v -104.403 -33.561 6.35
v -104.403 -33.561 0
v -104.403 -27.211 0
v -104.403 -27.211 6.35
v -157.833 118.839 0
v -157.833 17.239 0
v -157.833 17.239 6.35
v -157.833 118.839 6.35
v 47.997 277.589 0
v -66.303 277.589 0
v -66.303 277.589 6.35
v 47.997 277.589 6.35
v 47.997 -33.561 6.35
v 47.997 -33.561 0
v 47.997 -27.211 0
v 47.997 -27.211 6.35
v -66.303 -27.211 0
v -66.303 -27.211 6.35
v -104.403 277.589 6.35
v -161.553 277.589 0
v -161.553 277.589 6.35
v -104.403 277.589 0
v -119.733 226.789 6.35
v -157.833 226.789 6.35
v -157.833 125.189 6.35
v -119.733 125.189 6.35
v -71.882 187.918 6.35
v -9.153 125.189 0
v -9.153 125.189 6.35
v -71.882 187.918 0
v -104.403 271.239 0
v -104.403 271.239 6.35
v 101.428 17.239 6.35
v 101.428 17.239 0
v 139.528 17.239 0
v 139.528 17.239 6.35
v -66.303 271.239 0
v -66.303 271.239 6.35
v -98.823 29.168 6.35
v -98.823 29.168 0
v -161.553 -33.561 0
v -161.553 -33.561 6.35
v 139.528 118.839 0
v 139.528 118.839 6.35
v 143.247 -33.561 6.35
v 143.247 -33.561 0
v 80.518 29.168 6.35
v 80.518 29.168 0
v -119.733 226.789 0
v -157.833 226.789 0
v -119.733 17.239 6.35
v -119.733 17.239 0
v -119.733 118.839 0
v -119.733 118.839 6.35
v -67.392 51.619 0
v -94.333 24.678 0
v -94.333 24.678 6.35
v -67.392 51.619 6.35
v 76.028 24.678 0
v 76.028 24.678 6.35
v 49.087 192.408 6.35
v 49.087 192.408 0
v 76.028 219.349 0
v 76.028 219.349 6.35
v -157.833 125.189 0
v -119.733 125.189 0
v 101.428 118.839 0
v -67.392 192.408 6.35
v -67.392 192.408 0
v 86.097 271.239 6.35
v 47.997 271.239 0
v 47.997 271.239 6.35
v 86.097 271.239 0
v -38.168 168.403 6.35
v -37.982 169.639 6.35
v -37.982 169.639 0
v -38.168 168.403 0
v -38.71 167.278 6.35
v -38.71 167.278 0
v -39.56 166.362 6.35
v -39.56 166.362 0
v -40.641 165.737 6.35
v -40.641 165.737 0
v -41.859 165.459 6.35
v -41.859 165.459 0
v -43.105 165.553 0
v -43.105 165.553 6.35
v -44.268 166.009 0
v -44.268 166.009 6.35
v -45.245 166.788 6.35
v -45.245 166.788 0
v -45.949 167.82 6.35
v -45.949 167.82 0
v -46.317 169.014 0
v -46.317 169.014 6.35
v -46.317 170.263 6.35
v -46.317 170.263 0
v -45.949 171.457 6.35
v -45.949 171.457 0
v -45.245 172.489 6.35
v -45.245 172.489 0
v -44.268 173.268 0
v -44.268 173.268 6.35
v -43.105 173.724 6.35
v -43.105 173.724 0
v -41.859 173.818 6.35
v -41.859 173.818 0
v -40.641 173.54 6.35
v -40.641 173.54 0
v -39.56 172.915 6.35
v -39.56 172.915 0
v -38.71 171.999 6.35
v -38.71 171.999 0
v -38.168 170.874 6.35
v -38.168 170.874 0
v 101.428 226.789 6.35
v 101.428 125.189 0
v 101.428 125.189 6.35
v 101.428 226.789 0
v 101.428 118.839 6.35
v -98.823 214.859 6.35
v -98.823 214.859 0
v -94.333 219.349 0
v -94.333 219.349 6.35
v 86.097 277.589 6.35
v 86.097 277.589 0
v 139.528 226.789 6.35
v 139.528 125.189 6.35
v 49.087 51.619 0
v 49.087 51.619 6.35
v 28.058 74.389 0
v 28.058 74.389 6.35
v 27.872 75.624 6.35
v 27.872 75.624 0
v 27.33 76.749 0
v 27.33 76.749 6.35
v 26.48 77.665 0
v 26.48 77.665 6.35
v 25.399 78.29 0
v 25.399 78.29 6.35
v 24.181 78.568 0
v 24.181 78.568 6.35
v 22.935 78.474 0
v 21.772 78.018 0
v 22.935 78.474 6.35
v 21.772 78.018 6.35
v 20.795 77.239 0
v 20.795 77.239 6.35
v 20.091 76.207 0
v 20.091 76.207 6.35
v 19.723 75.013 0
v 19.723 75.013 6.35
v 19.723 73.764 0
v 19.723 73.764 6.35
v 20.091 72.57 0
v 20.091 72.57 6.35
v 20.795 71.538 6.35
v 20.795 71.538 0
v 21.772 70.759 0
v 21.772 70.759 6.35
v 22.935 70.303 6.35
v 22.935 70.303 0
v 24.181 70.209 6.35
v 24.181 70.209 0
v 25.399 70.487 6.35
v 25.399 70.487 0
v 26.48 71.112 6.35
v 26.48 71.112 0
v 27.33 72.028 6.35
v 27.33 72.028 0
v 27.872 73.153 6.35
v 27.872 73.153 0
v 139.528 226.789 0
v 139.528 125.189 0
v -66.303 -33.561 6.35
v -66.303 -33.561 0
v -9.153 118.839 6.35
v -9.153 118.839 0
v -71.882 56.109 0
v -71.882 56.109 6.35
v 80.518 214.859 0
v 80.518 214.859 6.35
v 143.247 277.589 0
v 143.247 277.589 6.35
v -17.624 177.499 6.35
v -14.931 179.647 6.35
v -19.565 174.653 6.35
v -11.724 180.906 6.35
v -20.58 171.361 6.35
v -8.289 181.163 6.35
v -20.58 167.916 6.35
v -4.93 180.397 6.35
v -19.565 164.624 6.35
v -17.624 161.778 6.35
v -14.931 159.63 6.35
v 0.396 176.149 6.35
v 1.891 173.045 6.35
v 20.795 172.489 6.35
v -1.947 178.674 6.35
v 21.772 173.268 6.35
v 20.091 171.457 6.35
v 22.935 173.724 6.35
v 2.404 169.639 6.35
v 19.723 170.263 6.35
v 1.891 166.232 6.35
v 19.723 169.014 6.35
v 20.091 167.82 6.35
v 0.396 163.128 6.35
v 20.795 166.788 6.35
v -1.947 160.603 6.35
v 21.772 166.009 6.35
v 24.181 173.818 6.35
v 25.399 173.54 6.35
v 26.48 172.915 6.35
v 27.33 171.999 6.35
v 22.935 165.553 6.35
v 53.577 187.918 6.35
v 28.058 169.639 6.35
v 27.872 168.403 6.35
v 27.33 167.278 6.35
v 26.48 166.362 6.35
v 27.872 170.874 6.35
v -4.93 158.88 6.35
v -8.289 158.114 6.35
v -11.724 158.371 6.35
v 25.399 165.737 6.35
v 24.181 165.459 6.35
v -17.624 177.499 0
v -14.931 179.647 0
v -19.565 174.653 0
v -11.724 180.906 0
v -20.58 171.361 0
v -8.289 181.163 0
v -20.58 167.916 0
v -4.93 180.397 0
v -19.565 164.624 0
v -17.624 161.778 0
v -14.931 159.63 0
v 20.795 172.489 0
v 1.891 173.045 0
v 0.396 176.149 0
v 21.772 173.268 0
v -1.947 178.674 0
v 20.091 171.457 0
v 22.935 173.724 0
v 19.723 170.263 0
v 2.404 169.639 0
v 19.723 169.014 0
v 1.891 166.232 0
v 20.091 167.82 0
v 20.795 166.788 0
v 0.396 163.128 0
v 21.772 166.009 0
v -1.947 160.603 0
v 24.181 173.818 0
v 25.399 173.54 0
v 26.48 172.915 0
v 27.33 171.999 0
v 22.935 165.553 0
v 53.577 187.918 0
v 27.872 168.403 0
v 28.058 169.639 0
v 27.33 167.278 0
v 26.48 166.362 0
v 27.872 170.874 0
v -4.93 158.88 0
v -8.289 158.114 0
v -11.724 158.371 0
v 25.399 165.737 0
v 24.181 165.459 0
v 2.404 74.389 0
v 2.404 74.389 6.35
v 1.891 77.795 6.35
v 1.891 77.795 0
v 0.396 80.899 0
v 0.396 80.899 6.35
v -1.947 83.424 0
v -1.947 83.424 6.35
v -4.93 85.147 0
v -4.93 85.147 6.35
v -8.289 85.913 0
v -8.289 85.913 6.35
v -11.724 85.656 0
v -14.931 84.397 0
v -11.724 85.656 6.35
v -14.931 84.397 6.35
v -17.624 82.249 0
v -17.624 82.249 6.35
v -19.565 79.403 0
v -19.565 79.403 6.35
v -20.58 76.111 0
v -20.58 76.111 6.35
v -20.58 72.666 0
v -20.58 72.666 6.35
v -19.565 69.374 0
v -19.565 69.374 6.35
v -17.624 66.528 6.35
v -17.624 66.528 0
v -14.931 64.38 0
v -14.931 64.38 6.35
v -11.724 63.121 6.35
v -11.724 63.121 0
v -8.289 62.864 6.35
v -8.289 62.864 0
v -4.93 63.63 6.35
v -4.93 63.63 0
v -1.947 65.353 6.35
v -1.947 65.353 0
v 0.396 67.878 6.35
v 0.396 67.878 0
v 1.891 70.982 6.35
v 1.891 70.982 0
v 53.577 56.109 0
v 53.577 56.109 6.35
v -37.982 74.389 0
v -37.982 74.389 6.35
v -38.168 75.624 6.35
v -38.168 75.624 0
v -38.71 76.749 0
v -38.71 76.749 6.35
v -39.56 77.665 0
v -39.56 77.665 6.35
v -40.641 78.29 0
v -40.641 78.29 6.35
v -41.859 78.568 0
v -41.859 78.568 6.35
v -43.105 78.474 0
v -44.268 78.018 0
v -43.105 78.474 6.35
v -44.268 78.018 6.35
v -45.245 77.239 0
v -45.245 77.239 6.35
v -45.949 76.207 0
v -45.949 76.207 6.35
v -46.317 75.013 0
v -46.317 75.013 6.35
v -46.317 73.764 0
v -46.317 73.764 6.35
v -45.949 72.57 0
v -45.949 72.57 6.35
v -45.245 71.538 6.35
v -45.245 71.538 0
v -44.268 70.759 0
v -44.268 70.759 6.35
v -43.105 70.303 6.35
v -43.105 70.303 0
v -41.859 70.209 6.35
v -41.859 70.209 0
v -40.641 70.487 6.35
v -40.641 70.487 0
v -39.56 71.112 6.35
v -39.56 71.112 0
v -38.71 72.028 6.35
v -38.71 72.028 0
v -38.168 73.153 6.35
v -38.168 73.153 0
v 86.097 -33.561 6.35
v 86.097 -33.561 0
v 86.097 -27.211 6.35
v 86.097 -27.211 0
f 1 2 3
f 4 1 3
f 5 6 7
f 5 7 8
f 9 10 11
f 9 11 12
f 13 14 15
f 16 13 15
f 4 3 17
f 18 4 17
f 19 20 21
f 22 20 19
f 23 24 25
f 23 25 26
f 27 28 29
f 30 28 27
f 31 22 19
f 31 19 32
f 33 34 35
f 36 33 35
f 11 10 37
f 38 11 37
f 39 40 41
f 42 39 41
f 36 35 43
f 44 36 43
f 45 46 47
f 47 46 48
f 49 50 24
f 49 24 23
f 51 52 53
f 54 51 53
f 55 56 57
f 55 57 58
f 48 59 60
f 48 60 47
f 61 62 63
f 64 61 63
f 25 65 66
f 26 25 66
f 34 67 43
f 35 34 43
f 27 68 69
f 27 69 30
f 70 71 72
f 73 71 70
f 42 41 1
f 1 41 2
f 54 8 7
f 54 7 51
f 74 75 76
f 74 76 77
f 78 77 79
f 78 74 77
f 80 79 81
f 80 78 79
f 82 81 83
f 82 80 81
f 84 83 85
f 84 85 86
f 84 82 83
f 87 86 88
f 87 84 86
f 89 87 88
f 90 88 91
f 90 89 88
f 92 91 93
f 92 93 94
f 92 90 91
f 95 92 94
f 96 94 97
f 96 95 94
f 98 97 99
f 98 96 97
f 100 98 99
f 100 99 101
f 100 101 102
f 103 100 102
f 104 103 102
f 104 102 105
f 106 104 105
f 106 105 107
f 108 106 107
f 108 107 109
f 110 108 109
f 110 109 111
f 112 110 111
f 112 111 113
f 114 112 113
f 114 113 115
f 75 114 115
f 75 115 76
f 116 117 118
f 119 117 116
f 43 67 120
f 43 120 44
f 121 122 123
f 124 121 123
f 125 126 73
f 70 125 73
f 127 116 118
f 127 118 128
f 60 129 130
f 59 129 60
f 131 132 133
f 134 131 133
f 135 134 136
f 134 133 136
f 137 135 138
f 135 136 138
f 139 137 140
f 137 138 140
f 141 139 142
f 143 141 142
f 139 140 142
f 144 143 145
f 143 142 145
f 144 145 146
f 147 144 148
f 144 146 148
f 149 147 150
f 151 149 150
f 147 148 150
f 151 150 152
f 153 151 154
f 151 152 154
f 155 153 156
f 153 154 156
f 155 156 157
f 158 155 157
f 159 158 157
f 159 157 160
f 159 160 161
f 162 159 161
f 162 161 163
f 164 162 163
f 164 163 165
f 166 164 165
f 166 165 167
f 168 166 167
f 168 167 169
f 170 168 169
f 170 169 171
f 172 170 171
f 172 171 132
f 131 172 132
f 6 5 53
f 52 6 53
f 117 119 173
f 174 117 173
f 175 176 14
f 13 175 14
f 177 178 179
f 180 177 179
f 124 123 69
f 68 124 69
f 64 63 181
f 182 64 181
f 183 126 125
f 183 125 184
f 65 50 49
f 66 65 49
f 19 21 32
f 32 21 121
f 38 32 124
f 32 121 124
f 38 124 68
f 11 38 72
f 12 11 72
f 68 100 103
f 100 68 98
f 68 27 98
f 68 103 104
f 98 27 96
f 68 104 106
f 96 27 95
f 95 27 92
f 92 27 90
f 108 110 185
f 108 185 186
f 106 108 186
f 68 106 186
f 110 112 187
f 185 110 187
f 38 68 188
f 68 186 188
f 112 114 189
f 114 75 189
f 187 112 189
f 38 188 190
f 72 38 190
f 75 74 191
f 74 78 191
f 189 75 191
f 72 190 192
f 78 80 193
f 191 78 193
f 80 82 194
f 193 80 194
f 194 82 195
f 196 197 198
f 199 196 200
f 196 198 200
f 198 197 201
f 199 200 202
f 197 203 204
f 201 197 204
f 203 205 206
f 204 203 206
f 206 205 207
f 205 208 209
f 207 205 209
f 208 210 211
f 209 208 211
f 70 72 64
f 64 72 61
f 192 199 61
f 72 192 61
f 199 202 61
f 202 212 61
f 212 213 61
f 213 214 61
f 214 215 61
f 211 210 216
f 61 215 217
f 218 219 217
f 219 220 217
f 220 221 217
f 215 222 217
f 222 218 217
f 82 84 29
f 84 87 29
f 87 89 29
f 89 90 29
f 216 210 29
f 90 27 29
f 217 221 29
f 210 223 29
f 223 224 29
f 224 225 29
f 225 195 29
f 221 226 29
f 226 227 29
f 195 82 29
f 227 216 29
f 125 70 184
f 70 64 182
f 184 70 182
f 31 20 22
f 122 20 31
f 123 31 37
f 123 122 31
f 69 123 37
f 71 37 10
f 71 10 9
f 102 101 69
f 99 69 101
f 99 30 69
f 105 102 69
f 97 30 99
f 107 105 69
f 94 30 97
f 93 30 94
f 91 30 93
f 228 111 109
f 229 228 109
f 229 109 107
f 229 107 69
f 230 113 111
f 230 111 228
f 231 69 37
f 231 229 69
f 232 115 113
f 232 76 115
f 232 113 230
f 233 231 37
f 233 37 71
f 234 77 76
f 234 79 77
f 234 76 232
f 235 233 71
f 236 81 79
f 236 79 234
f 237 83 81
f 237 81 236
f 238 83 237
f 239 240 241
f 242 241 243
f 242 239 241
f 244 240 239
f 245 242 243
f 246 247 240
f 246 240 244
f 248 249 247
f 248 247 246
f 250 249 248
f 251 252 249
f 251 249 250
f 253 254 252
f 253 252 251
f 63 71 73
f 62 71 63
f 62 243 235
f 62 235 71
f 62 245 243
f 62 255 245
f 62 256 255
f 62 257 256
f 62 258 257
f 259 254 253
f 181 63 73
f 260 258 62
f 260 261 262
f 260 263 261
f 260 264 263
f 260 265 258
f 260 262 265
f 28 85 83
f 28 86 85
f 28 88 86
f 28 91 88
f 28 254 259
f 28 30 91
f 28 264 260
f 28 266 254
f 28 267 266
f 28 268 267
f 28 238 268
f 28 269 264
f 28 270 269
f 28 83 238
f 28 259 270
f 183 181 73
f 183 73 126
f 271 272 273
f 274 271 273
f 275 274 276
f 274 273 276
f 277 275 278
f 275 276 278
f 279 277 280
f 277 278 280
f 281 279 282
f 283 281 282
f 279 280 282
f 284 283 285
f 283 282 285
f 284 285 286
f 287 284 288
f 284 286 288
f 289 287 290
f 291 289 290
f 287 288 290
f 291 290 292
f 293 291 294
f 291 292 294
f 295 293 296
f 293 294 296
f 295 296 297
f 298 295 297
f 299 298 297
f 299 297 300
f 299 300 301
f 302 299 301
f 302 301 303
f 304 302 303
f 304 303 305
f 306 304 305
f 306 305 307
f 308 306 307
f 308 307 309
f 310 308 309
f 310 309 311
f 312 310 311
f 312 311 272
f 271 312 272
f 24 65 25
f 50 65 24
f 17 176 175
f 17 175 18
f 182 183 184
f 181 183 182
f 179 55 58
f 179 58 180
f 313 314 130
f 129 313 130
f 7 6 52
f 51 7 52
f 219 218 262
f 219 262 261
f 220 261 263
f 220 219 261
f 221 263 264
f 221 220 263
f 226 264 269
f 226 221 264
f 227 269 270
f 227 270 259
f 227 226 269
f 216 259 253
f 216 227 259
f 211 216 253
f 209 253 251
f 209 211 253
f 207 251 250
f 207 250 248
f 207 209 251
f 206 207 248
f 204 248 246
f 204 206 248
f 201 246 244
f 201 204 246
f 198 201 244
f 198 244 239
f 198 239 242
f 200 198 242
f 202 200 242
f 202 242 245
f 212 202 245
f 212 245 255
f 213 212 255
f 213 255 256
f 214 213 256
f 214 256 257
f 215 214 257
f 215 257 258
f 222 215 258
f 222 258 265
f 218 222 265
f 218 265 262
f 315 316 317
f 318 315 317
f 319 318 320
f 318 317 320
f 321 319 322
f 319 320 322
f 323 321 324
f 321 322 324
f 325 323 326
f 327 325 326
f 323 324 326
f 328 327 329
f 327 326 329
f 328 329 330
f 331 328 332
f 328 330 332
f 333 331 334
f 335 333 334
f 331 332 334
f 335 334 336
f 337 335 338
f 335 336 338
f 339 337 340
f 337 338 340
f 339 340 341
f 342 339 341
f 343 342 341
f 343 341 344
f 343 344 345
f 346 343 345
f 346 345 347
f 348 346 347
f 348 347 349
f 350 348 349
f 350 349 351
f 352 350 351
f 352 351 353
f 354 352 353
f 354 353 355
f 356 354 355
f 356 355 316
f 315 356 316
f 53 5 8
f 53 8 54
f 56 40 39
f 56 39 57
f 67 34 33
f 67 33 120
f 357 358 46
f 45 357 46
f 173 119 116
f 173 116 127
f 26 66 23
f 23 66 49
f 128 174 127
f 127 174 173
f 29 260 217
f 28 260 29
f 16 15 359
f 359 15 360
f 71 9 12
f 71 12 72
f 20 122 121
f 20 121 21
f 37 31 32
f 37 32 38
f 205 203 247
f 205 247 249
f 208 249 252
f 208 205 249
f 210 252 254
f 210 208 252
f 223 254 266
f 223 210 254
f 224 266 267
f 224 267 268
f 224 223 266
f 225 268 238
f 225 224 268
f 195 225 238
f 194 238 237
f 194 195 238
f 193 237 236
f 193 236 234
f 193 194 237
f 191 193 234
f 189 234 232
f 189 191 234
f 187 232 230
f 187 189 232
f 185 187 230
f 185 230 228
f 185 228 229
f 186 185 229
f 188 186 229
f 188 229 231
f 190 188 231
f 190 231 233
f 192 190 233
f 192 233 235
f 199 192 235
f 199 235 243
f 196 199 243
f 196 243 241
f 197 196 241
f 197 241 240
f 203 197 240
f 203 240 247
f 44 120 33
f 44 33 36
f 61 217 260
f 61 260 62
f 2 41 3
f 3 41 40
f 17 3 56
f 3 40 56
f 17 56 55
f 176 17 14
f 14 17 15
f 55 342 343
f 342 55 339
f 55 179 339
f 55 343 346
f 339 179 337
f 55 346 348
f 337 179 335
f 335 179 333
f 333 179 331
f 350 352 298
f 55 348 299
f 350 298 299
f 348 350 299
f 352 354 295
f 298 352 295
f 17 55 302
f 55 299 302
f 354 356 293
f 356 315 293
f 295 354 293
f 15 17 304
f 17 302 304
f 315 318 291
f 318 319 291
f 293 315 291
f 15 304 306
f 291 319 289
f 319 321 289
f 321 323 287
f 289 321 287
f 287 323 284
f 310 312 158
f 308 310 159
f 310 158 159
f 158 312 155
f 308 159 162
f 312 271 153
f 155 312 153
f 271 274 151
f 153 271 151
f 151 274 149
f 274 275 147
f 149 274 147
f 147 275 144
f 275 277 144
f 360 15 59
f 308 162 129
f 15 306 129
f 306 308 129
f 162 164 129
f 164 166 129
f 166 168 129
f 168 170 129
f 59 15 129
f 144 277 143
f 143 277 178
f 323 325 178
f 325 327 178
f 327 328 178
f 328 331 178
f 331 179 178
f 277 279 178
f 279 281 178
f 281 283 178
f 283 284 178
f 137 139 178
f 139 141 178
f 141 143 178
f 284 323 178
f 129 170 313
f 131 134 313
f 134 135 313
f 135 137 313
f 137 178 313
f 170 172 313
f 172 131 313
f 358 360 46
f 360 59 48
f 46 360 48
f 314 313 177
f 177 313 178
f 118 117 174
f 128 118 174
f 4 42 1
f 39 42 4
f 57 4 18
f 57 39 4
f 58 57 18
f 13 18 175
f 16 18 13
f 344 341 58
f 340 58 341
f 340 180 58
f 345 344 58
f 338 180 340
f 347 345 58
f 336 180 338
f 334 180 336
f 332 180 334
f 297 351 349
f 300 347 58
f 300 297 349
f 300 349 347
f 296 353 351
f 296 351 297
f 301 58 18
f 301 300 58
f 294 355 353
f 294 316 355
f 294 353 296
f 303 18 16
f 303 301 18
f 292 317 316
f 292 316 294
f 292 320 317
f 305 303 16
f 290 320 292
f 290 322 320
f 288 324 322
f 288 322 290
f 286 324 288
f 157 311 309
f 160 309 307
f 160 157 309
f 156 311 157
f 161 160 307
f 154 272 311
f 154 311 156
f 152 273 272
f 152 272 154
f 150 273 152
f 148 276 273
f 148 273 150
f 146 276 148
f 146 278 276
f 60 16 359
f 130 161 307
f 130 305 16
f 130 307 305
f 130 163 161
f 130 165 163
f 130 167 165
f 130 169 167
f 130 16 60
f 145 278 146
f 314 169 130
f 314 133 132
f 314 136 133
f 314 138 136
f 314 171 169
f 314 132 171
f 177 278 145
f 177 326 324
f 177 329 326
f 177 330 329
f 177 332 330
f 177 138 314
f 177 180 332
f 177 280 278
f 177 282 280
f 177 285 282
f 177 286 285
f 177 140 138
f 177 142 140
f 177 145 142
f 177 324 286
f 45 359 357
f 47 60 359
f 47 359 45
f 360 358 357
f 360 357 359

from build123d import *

# Parameters (mm, degrees)
F1_DEPTH  = 6.35
F2_R      = 11.557
F3_DEPTH  = 25.4
F4_W      = 38.1
F4_H      = 101.6
F6_DEPTH  = 6.35
F7_W      = 38.1
F7_H      = 6.35
F8_DEPTH  = 25.4
F9_R      = 4.191
F10_DEPTH = 25.4


with BuildPart() as f1:
    # F0 (on Top) → F1 (new body)
    with BuildSketch(Plane.XY):
        Polygon((-9.152558, 118.838572), (-161.552558, -33.561428), (143.247442, -33.561428), align=None)
    extrude(amount=F1_DEPTH)

    # F2 (on face) → F3 (cut)
    with BuildSketch(Plane.XY.offset(6.35)):
        with Locations((-9.152558, 74.388572)):
            Circle(F2_R)
    extrude(amount=-F3_DEPTH, mode=Mode.SUBTRACT)

    # F7 (on Top) → F8 (cut)
    with BuildSketch(Plane.XY):
        Polygon((76.027698, 24.67806), (80.517826, 29.168188), (53.577058, 56.108957), (49.08693, 51.618829), align=None)
        Polygon((-71.882174, 56.108957), (-98.822942, 29.168188), (-94.332814, 24.67806), (-67.392045, 51.618829), align=None)
        with Locations((-85.352558, -30.386428)):
            Rectangle(F7_W, F7_H)
        with Locations((67.047442, -30.386428)):
            Rectangle(F7_W, F7_H)
    extrude(amount=F8_DEPTH, mode=Mode.SUBTRACT)

    # F9 (on face) → F10 (cut)
    with BuildSketch(Plane.XY.offset(6.35)):
        with Locations((-42.172558, 74.388572)):
            Circle(F9_R)
        with Locations((23.867442, 74.388572)):
            Circle(F9_R)
    extrude(amount=-F10_DEPTH, mode=Mode.SUBTRACT)


with BuildPart() as f6:
    # F4 (on Top) → F6 (new body)
    with BuildSketch(Plane.XY):
        with Locations((-138.782814, 175.988572)):
            Rectangle(F4_W, F4_H)
        with Locations((-138.782814, 68.038572)):
            Rectangle(F4_W, F4_H)
        with Locations((120.477698, 175.988572)):
            Rectangle(F4_W, F4_H)
        with Locations((120.477698, 68.038572)):
            Rectangle(F4_W, F4_H)
    extrude(amount=F6_DEPTH)


with BuildPart() as f11_1:
    # F11: instance of F1
    add(f1.part.mirror(Plane(origin=(-9.152558, 122.013572, 3.175), x_dir=(1, 0, 0), z_dir=(0, -1, 0))))


solid = Compound([f1.part, f6.part, f11_1.part])
